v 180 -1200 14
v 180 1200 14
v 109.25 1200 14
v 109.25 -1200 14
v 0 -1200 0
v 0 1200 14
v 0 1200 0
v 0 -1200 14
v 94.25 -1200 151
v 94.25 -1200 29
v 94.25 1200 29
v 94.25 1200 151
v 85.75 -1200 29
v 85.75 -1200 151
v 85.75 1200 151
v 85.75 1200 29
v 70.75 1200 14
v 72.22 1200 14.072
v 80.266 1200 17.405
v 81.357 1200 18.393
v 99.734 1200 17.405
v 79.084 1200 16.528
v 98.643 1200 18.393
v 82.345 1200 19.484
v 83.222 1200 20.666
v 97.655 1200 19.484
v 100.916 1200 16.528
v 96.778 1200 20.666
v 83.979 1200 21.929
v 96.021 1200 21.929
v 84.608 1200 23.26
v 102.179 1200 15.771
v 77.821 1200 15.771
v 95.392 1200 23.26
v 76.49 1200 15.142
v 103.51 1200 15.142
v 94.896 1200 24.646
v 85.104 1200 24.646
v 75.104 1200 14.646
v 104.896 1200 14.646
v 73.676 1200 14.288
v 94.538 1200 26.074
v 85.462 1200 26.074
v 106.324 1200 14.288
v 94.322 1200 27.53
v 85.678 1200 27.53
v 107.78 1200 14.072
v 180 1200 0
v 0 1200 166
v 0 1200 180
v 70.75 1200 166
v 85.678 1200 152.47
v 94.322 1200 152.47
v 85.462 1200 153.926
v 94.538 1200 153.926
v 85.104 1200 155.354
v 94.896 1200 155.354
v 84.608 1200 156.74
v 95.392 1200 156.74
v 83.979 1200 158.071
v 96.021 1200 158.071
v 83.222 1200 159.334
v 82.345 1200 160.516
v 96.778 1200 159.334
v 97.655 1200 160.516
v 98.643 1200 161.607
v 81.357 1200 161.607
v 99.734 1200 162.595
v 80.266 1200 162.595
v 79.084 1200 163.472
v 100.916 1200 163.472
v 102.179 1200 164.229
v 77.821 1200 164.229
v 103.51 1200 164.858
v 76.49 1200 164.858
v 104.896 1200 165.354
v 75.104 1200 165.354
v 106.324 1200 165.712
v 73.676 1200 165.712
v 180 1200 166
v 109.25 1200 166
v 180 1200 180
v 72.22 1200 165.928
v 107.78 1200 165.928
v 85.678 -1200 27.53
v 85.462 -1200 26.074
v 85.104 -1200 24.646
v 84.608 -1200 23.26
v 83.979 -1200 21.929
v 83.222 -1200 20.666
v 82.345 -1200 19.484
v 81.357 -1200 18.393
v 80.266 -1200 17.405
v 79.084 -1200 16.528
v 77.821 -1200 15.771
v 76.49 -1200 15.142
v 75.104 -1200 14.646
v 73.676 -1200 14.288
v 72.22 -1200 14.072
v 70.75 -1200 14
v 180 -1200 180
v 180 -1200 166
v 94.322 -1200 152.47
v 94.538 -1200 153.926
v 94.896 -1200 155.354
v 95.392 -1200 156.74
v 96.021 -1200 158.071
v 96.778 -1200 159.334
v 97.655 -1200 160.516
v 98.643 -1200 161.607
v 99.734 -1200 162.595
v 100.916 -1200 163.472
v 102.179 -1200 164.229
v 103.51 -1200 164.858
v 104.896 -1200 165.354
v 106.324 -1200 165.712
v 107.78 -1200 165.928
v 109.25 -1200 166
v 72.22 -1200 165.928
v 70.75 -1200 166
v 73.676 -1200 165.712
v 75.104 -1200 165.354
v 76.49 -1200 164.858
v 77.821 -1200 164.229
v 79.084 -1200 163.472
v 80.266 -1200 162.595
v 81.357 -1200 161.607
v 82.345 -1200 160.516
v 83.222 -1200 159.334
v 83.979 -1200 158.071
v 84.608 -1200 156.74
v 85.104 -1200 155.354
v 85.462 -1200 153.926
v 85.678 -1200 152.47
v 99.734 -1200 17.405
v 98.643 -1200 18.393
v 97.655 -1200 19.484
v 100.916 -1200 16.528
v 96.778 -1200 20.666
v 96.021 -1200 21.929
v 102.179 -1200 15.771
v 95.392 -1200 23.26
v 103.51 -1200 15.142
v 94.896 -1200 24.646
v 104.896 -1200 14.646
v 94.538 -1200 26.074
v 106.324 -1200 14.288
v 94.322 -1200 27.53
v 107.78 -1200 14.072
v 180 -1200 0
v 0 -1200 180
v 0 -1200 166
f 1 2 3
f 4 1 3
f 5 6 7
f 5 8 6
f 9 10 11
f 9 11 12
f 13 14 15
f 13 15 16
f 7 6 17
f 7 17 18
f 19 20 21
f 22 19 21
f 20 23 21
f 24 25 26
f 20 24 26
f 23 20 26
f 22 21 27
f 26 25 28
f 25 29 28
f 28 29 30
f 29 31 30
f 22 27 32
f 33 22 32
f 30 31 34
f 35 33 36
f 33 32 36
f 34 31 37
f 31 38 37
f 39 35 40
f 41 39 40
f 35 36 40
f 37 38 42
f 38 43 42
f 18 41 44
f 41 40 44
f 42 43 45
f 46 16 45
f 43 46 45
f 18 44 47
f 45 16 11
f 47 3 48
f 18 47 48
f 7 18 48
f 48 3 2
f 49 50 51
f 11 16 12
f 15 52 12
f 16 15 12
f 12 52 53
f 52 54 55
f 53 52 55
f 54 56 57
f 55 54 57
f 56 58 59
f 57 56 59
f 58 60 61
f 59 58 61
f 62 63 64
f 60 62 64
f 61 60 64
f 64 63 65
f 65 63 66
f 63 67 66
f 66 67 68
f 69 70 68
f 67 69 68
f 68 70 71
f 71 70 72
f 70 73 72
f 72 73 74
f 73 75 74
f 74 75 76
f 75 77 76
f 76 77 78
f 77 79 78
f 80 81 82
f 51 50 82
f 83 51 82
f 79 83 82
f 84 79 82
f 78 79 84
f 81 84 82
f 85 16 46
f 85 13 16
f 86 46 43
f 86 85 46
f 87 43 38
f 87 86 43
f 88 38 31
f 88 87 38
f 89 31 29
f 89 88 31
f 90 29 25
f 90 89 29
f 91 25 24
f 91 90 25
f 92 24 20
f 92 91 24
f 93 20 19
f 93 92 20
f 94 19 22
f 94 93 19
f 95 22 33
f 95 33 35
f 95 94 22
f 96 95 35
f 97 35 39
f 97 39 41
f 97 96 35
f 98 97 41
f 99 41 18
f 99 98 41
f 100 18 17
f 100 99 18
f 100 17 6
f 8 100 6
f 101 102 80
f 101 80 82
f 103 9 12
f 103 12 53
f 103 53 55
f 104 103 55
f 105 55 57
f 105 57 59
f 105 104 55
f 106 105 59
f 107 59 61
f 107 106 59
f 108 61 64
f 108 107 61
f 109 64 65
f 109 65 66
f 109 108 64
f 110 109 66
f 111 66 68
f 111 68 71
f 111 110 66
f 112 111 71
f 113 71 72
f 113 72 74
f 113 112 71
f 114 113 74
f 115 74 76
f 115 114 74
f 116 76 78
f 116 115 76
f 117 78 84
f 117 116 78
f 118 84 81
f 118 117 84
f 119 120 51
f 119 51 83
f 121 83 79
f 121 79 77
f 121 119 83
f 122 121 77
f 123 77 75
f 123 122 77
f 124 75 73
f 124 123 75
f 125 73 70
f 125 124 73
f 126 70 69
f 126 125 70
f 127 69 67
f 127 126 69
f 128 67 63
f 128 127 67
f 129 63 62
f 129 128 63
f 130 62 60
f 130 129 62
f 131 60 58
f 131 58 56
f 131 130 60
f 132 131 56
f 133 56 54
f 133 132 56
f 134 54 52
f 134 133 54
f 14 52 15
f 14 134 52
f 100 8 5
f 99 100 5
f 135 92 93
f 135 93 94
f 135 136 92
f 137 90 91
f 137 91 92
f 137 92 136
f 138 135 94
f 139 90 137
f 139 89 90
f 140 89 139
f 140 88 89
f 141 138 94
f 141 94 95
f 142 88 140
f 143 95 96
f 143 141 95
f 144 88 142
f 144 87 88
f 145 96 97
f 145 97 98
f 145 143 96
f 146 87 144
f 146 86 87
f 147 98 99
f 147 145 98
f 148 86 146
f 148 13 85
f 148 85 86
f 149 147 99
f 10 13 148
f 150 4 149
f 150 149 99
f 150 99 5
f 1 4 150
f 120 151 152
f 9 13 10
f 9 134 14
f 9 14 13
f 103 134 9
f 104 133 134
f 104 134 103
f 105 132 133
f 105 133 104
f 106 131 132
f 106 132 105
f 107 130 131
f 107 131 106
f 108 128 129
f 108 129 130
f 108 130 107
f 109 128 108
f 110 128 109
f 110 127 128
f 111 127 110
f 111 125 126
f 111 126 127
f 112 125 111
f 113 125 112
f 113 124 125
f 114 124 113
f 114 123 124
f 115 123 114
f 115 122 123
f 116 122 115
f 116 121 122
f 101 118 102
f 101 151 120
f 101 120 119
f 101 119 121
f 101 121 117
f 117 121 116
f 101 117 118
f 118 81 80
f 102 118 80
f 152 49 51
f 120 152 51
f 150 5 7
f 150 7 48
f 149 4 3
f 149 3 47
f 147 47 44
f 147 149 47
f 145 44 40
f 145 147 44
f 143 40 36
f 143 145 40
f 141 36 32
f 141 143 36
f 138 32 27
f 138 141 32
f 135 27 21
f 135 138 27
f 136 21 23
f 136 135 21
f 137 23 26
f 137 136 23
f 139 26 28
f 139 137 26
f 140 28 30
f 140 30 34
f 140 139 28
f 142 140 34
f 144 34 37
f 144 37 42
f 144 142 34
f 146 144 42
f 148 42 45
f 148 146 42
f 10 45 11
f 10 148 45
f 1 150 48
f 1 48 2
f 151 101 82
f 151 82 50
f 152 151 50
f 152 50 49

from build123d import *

# Parameters (mm, degrees)
F1_DEPTH = 1200


with BuildPart() as f1:
    # F0 (on Front) → F1 (new body, symmetric)
    with BuildSketch(Plane.XZ):
        with BuildLine():
            Line((0, 14), (0, 0))
            Line((0, 0), (180, 0))
            Line((180, 0), (180, 14))
            Line((180, 14), (109.25, 14))
            ThreePointArc((109.25, 14), (98.643398, 18.393398), (94.25, 29))
            Line((94.25, 29), (94.25, 151))
            ThreePointArc((94.25, 151), (98.643398, 161.606602), (109.25, 166))
            Line((109.25, 166), (180, 166))
            Line((180, 166), (180, 180))
            Line((180, 180), (0, 180))
            Line((0, 180), (0, 166))
            Line((0, 166), (70.75, 166))
            ThreePointArc((70.75, 166), (81.356602, 161.606602), (85.75, 151))
            Line((85.75, 151), (85.75, 29))
            ThreePointArc((85.75, 29), (81.356602, 18.393398), (70.75, 14))
            Line((70.75, 14), (0, 14))
        make_face()
    extrude(amount=F1_DEPTH, both=True)


solid = f1.part
